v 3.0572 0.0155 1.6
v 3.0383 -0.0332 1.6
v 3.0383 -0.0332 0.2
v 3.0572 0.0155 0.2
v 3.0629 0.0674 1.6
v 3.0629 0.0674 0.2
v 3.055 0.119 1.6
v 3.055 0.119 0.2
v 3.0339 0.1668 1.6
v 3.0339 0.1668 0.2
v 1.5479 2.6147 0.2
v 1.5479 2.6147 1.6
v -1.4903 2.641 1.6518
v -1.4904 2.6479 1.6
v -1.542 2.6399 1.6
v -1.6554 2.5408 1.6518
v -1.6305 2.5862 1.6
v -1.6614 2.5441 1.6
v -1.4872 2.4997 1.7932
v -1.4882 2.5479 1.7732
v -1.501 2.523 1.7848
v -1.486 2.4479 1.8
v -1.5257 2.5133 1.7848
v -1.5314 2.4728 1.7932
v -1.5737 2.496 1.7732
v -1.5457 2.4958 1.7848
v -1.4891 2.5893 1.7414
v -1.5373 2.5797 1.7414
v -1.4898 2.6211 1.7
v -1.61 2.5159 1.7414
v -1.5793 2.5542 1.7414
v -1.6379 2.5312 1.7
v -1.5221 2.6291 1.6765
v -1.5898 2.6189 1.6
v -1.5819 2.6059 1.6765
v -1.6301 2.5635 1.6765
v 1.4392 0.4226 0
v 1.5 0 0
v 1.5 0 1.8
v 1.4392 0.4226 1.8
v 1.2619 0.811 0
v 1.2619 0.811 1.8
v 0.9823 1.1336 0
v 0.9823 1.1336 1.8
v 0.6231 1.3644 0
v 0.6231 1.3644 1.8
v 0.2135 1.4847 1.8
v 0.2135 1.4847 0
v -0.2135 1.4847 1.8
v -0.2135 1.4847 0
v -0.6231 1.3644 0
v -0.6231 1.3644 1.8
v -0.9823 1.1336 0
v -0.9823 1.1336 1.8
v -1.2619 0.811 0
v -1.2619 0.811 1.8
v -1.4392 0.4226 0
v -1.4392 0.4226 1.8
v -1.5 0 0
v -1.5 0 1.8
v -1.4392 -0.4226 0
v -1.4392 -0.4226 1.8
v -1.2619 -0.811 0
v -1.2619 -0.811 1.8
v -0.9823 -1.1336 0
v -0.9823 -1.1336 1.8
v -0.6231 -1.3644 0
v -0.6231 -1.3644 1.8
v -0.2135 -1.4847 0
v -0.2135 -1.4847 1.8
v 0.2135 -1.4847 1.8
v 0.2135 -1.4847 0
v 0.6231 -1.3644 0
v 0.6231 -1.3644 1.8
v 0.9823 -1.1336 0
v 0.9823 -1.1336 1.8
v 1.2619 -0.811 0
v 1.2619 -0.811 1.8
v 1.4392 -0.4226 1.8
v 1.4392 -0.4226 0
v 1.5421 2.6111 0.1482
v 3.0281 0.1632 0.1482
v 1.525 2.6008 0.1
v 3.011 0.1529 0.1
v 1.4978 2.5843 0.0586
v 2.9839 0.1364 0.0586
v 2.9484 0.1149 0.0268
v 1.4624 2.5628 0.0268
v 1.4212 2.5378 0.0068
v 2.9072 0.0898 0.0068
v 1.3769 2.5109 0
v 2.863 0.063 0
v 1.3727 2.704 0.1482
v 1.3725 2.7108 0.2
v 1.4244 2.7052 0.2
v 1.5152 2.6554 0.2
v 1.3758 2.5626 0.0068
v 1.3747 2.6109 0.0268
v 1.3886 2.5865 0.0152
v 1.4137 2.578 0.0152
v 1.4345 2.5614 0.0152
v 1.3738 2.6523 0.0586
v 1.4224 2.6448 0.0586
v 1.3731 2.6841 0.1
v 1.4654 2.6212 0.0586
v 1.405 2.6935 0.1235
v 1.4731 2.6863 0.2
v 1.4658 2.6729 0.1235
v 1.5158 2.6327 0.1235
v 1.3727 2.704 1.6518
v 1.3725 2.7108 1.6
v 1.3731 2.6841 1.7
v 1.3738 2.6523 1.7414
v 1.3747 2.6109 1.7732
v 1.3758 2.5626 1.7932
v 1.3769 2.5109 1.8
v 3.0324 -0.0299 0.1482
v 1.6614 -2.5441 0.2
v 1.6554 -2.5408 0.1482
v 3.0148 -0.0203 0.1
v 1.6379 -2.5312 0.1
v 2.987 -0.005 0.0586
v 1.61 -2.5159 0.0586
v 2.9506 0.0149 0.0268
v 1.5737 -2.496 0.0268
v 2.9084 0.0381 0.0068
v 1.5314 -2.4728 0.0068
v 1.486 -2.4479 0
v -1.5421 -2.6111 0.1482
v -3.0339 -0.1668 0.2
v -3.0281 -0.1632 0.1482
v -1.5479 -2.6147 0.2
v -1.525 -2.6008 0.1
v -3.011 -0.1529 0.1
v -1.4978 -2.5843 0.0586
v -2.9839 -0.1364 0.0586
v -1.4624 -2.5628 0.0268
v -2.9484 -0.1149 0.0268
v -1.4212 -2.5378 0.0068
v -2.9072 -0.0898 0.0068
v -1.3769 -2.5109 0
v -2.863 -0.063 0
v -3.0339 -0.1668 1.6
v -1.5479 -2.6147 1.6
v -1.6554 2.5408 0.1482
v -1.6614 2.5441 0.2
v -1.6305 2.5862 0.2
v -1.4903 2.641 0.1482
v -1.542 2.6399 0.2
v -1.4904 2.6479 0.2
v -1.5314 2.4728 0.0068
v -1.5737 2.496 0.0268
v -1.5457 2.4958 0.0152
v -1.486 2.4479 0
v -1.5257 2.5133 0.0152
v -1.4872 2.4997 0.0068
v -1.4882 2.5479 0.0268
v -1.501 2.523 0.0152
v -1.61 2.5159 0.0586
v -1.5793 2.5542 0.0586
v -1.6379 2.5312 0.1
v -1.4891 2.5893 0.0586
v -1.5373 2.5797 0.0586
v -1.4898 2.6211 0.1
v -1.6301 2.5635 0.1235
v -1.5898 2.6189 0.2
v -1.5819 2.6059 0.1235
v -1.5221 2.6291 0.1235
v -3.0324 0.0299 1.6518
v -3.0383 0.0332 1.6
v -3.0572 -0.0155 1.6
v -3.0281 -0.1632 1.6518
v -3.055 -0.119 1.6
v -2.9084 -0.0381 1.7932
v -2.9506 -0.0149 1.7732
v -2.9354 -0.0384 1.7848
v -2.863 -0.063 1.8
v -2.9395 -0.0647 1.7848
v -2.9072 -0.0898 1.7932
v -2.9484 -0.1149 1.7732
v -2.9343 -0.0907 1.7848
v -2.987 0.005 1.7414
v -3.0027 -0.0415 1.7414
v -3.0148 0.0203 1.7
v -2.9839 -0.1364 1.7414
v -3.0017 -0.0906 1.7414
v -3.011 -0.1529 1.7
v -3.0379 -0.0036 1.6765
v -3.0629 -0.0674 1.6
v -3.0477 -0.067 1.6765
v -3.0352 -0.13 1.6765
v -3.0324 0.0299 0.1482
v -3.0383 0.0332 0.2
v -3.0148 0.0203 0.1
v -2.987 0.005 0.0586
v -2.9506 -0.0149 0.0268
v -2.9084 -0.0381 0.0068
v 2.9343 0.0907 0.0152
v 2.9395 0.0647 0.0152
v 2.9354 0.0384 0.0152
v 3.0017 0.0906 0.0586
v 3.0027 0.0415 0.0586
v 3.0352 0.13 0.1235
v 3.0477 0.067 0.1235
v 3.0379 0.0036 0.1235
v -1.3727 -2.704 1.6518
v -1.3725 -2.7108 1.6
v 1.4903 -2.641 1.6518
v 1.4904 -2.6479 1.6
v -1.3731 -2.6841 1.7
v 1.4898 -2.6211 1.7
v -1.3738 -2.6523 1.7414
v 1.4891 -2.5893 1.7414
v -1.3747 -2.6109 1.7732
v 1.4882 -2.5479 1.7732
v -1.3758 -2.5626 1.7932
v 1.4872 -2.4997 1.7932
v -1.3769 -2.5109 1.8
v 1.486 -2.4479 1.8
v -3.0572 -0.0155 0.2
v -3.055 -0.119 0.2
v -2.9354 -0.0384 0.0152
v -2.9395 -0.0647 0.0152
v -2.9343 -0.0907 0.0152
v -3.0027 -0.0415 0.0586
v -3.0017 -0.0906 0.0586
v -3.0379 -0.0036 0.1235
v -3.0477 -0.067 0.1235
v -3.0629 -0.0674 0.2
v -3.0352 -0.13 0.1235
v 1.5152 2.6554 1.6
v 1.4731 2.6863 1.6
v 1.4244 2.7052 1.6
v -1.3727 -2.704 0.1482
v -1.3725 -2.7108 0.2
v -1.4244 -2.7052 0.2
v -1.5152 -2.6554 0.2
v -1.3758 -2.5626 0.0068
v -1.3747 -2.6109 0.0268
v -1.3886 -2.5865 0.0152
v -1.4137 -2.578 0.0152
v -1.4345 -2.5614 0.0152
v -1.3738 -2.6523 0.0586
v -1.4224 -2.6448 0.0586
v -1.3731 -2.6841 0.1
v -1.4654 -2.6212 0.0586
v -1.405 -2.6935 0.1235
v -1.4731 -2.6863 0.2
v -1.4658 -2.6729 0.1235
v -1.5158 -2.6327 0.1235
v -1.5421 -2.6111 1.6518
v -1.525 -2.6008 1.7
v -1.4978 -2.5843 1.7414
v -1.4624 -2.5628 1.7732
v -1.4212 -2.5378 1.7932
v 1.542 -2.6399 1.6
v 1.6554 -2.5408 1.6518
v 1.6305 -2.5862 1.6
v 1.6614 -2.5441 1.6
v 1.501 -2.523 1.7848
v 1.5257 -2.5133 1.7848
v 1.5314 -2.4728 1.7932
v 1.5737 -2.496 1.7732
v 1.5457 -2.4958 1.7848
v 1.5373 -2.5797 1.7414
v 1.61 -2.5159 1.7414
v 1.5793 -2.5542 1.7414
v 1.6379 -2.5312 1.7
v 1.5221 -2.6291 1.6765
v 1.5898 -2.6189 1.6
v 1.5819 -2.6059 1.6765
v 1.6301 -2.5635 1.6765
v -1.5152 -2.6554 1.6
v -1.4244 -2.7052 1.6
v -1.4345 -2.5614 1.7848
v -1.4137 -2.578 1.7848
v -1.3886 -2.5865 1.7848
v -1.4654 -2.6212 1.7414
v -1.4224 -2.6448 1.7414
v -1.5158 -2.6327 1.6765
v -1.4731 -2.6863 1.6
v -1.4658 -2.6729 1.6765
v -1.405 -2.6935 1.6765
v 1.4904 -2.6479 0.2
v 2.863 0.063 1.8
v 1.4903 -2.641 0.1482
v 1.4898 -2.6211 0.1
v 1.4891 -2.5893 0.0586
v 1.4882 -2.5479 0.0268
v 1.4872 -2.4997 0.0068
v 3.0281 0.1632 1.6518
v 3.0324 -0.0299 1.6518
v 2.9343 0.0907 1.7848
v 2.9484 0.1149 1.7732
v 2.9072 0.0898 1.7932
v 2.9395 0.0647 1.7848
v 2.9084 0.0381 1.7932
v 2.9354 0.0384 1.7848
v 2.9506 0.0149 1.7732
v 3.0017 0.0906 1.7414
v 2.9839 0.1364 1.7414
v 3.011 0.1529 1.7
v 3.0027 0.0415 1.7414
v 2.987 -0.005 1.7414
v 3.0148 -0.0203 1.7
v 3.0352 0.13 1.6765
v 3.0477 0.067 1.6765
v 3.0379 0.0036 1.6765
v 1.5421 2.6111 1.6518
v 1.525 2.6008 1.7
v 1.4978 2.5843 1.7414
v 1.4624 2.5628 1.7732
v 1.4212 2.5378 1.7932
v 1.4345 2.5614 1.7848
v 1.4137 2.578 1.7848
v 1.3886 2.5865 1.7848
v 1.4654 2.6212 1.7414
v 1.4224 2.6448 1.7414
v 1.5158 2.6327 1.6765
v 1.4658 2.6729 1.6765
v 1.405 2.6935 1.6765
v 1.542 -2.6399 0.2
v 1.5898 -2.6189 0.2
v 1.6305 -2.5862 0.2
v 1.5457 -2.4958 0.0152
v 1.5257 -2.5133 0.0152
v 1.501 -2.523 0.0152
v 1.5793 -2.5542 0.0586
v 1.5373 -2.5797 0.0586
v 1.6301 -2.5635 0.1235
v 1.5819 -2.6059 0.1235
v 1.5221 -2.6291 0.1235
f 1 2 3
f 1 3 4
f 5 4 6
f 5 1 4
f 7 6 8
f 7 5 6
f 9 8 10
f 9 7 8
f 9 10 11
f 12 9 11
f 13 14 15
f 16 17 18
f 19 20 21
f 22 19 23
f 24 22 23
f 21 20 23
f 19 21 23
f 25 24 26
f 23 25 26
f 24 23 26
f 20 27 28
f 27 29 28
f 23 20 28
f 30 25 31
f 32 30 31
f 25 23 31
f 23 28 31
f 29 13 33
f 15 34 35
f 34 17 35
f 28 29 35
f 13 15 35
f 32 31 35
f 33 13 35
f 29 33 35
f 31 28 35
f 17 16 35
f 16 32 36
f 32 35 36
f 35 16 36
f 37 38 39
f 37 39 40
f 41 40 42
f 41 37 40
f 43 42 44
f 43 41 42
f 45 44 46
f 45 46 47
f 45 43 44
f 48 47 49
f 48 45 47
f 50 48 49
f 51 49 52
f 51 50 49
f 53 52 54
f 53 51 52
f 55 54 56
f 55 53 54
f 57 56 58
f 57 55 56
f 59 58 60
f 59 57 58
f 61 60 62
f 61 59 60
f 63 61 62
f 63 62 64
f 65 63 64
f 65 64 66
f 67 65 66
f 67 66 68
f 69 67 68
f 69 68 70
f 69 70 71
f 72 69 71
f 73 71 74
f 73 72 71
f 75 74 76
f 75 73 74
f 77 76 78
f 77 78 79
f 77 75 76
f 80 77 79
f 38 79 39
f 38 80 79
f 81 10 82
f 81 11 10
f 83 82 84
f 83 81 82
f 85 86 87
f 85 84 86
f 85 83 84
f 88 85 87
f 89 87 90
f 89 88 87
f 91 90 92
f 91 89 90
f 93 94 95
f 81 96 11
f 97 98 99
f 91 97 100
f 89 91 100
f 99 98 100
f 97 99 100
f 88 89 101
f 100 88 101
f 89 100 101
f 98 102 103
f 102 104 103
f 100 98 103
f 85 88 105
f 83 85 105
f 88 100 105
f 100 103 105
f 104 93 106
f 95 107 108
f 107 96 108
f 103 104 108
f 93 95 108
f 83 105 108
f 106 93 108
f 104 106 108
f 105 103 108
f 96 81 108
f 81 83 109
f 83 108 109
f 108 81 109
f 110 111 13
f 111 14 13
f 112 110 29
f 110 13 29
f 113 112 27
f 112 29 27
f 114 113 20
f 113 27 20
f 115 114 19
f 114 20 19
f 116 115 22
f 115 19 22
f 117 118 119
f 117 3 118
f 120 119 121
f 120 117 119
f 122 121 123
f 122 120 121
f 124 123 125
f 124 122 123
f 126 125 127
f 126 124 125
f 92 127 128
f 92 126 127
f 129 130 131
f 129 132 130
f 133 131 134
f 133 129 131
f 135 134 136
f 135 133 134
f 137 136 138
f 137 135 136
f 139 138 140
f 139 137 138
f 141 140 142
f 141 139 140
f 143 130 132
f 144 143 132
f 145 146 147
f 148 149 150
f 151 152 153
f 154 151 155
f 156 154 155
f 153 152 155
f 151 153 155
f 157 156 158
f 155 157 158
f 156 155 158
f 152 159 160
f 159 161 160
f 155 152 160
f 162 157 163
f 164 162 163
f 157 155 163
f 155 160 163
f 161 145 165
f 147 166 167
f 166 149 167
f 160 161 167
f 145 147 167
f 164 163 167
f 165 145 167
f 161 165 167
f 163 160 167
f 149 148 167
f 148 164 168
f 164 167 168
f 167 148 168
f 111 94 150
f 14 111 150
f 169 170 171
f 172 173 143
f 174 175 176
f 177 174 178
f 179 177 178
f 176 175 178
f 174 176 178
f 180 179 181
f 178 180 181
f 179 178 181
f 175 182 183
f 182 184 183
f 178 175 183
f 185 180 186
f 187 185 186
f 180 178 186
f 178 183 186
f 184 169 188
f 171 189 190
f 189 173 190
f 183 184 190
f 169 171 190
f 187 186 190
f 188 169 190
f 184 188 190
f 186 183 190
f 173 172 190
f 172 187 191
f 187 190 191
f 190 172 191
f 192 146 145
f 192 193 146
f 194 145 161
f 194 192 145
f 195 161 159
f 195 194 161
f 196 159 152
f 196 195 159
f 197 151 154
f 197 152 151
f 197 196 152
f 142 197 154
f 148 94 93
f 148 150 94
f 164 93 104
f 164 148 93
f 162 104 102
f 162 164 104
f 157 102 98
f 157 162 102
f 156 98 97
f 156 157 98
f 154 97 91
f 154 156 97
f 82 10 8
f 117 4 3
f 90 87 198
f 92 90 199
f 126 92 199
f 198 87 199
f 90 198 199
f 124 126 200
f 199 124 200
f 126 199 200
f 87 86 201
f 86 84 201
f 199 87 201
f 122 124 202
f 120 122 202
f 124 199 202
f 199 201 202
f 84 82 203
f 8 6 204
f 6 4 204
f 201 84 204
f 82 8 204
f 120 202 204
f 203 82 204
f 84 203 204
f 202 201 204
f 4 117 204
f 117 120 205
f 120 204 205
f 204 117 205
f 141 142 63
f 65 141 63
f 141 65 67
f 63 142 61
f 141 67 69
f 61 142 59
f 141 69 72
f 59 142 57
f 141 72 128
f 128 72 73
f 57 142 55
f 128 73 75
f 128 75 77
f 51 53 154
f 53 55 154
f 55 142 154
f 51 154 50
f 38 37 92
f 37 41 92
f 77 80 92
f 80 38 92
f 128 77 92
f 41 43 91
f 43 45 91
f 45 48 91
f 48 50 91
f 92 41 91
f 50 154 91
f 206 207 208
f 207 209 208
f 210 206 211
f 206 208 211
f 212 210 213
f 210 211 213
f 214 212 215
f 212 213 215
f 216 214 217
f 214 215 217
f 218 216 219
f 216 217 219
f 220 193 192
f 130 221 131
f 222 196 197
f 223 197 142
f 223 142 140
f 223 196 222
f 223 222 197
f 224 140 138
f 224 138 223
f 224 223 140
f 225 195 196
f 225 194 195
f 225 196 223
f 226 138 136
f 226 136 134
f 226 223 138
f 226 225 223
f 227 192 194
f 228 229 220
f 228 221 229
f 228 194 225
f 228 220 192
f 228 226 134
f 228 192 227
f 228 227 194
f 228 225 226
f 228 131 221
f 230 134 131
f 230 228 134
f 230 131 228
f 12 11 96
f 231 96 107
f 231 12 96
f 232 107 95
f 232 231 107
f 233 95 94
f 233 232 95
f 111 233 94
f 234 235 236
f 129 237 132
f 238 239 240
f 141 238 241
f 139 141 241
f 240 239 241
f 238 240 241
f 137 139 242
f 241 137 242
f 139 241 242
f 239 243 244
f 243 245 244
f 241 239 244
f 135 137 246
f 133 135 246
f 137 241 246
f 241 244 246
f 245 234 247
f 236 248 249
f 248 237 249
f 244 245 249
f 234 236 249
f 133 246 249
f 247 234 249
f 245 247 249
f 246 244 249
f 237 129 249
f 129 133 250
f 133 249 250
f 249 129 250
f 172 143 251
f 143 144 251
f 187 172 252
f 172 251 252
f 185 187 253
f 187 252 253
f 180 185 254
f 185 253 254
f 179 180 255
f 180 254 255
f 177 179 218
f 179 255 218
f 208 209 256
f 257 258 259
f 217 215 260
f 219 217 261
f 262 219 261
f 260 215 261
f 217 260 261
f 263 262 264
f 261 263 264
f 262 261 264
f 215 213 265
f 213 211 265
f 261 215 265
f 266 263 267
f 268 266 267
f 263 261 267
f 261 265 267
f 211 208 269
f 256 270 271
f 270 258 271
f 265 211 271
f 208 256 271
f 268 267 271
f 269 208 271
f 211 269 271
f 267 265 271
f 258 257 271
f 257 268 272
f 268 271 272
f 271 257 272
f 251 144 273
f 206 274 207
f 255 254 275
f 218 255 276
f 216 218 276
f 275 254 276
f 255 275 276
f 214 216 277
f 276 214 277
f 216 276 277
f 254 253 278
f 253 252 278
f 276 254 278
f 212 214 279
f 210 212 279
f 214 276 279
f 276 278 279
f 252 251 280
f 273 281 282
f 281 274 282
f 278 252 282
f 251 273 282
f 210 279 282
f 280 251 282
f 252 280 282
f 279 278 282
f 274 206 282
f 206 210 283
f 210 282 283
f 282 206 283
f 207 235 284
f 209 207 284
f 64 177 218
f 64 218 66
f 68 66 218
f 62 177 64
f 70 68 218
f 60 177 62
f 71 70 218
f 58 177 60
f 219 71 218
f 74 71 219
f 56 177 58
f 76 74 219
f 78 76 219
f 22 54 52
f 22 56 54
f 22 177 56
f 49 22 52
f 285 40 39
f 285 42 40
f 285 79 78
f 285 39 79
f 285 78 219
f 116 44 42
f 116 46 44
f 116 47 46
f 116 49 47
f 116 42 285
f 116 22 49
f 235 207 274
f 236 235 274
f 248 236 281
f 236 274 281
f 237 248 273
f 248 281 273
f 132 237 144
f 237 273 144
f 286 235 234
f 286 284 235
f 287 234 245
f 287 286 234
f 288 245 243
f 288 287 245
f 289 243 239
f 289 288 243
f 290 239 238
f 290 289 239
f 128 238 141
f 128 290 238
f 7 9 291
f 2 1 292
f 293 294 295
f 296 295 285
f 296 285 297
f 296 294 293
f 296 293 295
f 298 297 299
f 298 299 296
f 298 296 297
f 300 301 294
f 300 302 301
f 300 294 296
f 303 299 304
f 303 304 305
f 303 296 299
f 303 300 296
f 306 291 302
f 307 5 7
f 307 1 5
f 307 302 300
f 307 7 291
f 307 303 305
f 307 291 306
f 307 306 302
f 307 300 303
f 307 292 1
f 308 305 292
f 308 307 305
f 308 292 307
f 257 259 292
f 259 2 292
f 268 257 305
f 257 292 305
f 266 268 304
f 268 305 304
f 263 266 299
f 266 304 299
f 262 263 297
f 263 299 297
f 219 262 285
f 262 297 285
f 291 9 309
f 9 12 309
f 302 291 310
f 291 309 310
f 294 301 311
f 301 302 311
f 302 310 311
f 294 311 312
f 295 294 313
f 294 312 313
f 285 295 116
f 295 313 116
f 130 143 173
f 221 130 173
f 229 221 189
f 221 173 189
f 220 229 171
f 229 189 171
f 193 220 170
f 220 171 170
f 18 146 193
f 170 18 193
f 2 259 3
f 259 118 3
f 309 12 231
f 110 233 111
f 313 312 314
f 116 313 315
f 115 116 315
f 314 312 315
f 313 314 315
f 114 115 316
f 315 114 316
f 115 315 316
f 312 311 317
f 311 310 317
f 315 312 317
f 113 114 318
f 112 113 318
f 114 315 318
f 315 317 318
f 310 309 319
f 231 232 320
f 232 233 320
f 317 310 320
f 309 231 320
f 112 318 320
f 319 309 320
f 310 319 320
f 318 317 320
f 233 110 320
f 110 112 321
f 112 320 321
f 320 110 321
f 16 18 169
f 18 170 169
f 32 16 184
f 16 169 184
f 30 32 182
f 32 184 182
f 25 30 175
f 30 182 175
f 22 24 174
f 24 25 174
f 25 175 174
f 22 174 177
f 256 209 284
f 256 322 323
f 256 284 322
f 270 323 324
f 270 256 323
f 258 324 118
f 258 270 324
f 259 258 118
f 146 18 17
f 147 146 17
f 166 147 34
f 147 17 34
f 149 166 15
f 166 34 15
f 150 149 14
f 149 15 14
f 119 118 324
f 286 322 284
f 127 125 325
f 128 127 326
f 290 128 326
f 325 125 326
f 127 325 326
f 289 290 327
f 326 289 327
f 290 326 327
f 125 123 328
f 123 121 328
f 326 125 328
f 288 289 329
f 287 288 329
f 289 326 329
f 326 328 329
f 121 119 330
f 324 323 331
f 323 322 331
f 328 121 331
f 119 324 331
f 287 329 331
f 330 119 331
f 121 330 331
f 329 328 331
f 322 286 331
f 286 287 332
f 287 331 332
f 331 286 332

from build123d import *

# Parameters (mm, degrees)
SKETCH_1_R      = 1.5
EXTRUDE_1_DEPTH = 1.8
FILLET_2_R      = 0.2


with BuildPart() as part:
    # 草图1 → 凸台-拉伸1 (new body)
    with BuildSketch(Plane.XY):
        Polygon((-1.487983369, -2.713381438), (1.605865571, -2.645322117), (3.09384894, 0.068059321), (1.487983369, 2.713381438), (-1.605865571, 2.645322117), (-3.09384894, -0.068059321), align=None)
        Circle(SKETCH_1_R, mode=Mode.SUBTRACT)
    extrude(amount=EXTRUDE_1_DEPTH)

    # 圆角2
    fillet_2_edges = [part.edges().sort_by_distance(p)[0] for p in [
        (2.349857255, -1.288631398, 1.8),
        (-3.09384894, -0.068059321, 0.9),
        (-1.605865571, 2.645322117, 0.9),
        (1.487983369, 2.713381438, 0.9),
        (3.09384894, 0.068059321, 0.9),
        (1.605865571, -2.645322117, 0.9),
        (-1.487983369, -2.713381438, 0.9),
        (2.290916154, 1.390720379, 1.8),
        (-0.058941101, 2.679351777, 1.8),
        (-2.349857255, 1.288631398, 1.8),
        (-2.290916154, -1.390720379, 1.8),
        (-2.349857255, 1.288631398, 0),
        (-0.058941101, 2.679351777, 0),
        (2.290916154, 1.390720379, 0),
        (0.058941101, -2.679351777, 1.8),
        (2.349857255, -1.288631398, 0),
        (0.058941101, -2.679351777, 0),
        (-2.290916154, -1.390720379, 0),
    ]]
    fillet(fillet_2_edges, radius=FILLET_2_R)


solid = part.part
